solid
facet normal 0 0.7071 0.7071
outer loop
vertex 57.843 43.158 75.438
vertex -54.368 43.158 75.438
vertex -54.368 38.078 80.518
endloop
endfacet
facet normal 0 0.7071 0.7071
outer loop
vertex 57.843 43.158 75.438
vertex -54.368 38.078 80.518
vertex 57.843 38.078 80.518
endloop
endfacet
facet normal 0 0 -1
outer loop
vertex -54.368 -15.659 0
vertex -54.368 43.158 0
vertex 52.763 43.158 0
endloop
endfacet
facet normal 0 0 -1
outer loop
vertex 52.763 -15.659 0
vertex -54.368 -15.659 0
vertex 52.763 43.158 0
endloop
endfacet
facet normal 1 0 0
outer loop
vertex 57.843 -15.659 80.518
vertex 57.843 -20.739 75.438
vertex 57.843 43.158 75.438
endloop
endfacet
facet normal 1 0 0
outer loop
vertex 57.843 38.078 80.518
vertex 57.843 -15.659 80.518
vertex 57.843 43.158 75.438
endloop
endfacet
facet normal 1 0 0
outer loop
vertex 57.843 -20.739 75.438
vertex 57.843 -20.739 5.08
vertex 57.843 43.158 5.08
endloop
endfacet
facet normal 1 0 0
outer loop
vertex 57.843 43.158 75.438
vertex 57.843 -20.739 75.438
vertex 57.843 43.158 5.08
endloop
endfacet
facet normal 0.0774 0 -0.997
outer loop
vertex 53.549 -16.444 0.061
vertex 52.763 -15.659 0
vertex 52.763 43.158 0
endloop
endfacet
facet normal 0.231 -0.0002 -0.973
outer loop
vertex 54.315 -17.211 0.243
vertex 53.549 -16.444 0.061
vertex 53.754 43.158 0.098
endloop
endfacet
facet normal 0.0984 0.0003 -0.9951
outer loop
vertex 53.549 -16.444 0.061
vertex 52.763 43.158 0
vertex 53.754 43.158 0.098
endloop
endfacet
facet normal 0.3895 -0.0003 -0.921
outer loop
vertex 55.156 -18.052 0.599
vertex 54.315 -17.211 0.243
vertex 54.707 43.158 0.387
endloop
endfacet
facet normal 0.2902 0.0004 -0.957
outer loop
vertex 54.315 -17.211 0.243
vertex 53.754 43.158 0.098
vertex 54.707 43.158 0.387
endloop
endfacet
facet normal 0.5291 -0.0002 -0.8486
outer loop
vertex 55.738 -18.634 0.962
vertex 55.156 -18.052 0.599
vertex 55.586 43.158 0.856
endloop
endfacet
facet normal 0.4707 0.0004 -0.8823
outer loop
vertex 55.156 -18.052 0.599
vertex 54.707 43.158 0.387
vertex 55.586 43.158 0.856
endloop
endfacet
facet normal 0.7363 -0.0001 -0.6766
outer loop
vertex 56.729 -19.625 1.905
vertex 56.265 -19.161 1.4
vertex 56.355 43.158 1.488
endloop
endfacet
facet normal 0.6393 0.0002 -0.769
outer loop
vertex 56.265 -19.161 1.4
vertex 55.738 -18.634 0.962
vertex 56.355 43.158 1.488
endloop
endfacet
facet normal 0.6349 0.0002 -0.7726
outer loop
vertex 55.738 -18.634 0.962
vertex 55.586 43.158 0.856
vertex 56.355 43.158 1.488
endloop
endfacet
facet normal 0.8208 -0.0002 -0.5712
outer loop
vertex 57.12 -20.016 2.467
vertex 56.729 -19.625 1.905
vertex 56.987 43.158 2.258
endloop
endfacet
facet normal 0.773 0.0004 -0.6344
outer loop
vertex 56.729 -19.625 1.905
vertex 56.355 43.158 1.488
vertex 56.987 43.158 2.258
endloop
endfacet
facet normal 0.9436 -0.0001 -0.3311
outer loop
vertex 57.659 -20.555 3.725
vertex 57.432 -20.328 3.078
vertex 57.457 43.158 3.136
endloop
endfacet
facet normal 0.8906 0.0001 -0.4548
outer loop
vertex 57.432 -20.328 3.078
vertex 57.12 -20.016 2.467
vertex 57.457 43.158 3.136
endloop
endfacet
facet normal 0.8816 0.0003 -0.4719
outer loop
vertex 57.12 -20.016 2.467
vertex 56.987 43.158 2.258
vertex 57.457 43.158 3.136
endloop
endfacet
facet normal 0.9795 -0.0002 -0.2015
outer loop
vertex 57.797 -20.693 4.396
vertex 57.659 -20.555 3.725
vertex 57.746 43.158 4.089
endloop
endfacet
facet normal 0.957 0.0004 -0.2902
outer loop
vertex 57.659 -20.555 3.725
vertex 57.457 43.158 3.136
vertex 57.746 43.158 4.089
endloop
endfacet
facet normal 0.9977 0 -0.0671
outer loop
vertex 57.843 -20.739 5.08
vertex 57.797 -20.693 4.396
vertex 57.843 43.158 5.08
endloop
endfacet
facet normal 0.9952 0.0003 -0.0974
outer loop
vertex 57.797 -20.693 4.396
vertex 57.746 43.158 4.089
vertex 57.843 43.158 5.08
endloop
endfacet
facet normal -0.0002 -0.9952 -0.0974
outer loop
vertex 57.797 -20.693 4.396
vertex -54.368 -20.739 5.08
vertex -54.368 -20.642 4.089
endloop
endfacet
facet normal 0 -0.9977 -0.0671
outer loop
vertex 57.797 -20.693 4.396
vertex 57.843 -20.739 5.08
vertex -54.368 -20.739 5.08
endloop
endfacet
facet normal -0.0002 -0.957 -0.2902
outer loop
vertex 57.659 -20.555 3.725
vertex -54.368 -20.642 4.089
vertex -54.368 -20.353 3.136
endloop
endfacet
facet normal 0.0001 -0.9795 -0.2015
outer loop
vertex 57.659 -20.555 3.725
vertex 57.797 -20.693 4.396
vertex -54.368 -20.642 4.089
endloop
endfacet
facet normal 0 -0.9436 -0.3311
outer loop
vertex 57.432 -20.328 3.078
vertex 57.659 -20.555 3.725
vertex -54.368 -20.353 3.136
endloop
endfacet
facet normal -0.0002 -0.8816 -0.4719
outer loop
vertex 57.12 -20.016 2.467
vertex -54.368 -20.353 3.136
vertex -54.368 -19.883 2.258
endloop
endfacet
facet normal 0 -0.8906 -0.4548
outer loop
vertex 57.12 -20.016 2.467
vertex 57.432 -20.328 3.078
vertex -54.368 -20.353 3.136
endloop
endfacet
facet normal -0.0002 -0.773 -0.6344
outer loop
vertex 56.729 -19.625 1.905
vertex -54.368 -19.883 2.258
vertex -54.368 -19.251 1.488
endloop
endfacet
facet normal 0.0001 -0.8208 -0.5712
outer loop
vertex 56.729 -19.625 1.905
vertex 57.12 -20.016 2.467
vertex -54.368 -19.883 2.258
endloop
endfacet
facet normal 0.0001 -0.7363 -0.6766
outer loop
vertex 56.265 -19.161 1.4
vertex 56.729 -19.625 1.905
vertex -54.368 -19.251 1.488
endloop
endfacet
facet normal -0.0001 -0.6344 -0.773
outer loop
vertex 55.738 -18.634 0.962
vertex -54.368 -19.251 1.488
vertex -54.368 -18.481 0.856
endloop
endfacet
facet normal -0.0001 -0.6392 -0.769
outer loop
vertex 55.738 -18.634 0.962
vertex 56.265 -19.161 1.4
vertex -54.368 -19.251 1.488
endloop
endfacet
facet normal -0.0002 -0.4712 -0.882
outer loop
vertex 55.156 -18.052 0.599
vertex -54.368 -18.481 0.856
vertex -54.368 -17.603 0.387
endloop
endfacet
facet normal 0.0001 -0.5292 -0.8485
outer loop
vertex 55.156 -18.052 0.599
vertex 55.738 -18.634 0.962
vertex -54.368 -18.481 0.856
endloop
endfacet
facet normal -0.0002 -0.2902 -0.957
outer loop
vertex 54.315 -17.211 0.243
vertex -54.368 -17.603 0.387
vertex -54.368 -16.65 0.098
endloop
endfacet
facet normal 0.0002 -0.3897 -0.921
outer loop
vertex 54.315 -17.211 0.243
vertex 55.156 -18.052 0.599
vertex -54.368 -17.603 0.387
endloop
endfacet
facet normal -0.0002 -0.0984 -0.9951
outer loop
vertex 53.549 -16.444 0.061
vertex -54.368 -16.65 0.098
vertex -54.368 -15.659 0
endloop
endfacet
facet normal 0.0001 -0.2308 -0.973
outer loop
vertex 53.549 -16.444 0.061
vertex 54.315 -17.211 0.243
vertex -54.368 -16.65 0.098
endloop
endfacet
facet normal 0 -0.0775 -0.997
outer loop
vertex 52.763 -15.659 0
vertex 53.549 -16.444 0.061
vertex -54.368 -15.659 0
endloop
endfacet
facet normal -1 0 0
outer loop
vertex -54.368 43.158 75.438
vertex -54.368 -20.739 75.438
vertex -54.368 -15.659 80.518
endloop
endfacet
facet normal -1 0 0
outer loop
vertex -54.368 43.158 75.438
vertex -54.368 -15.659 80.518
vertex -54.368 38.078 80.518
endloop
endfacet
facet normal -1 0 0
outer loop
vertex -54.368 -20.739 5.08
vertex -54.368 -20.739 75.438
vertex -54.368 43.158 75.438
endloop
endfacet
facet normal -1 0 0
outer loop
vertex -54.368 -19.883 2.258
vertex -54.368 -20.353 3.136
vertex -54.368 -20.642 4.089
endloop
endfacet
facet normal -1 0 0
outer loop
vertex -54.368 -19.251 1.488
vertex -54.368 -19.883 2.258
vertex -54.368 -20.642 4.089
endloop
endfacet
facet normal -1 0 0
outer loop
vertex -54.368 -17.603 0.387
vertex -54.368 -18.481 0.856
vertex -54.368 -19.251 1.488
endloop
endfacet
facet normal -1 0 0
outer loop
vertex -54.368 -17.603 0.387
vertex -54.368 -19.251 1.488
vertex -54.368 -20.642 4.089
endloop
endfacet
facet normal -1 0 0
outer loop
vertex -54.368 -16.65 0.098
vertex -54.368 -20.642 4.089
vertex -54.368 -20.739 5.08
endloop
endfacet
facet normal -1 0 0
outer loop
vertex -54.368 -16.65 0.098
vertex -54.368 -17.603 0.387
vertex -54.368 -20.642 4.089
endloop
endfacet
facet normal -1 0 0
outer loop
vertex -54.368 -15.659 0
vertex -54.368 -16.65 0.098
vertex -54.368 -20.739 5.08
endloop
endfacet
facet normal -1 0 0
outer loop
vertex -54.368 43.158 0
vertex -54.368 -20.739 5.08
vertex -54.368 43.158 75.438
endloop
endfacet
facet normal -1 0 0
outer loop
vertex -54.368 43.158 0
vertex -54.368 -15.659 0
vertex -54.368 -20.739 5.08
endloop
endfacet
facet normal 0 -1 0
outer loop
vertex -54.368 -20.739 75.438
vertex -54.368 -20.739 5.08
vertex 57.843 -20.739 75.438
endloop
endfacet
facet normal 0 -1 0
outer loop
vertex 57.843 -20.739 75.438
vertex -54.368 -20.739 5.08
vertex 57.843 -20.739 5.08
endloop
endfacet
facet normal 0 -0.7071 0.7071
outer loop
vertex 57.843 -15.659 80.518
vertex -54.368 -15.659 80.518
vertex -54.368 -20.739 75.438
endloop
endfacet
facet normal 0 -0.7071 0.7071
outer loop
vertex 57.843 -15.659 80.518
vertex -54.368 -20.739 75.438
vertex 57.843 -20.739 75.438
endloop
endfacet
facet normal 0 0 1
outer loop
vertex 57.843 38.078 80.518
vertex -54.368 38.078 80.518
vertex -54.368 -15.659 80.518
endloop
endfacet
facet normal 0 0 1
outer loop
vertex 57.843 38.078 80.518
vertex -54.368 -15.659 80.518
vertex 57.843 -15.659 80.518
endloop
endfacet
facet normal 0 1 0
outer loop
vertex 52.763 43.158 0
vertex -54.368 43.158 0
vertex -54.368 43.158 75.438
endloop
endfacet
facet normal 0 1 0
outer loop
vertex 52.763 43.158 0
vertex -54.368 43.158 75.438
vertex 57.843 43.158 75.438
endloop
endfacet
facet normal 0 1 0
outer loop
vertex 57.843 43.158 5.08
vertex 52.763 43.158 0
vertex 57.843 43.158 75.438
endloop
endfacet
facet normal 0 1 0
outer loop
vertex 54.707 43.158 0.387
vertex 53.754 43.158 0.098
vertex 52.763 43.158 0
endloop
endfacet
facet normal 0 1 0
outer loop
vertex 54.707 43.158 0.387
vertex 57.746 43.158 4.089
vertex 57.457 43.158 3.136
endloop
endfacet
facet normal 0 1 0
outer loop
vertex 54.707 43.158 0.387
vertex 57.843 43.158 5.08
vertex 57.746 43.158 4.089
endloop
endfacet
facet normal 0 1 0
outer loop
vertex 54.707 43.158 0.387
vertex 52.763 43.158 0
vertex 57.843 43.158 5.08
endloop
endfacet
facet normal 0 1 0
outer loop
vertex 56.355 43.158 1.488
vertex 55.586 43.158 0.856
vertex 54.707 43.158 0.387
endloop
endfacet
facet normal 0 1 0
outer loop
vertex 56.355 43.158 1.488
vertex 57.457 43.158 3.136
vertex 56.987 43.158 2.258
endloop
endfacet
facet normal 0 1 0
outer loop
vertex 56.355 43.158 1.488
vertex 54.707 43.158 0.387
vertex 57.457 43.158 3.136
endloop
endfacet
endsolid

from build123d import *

# Parameters (mm, degrees)
F0_W     = 112.211272
F0_H     = 63.897693
F1_DEPTH = 80.518
F2_SIZE  = 5.08
F3_SIZE  = 5.08
F4_R     = 5.08


with BuildPart() as f1:
    # F0 (on Top) → F1 (new body)
    with BuildSketch(Plane.XY):
        with Locations((1.737624, 11.209644)):
            Rectangle(F0_W, F0_H)
    extrude(amount=F1_DEPTH)

    # F2
    f2_edges = [f1.edges().sort_by_distance(p)[0] for p in [
        (1.737624, -20.739203, 80.518),
    ]]
    chamfer(f2_edges, length=F2_SIZE)

    # F3
    f3_edges = [f1.edges().sort_by_distance(p)[0] for p in [
        (1.737624, 43.15849, 80.518),
    ]]
    chamfer(f3_edges, length=F3_SIZE)

    # F4
    f4_edges = [f1.edges().sort_by_distance(p)[0] for p in [
        (1.737624, -20.739203, 0),
        (57.84326, 11.209643, 0),
    ]]
    fillet(f4_edges, radius=F4_R)


solid = f1.part
